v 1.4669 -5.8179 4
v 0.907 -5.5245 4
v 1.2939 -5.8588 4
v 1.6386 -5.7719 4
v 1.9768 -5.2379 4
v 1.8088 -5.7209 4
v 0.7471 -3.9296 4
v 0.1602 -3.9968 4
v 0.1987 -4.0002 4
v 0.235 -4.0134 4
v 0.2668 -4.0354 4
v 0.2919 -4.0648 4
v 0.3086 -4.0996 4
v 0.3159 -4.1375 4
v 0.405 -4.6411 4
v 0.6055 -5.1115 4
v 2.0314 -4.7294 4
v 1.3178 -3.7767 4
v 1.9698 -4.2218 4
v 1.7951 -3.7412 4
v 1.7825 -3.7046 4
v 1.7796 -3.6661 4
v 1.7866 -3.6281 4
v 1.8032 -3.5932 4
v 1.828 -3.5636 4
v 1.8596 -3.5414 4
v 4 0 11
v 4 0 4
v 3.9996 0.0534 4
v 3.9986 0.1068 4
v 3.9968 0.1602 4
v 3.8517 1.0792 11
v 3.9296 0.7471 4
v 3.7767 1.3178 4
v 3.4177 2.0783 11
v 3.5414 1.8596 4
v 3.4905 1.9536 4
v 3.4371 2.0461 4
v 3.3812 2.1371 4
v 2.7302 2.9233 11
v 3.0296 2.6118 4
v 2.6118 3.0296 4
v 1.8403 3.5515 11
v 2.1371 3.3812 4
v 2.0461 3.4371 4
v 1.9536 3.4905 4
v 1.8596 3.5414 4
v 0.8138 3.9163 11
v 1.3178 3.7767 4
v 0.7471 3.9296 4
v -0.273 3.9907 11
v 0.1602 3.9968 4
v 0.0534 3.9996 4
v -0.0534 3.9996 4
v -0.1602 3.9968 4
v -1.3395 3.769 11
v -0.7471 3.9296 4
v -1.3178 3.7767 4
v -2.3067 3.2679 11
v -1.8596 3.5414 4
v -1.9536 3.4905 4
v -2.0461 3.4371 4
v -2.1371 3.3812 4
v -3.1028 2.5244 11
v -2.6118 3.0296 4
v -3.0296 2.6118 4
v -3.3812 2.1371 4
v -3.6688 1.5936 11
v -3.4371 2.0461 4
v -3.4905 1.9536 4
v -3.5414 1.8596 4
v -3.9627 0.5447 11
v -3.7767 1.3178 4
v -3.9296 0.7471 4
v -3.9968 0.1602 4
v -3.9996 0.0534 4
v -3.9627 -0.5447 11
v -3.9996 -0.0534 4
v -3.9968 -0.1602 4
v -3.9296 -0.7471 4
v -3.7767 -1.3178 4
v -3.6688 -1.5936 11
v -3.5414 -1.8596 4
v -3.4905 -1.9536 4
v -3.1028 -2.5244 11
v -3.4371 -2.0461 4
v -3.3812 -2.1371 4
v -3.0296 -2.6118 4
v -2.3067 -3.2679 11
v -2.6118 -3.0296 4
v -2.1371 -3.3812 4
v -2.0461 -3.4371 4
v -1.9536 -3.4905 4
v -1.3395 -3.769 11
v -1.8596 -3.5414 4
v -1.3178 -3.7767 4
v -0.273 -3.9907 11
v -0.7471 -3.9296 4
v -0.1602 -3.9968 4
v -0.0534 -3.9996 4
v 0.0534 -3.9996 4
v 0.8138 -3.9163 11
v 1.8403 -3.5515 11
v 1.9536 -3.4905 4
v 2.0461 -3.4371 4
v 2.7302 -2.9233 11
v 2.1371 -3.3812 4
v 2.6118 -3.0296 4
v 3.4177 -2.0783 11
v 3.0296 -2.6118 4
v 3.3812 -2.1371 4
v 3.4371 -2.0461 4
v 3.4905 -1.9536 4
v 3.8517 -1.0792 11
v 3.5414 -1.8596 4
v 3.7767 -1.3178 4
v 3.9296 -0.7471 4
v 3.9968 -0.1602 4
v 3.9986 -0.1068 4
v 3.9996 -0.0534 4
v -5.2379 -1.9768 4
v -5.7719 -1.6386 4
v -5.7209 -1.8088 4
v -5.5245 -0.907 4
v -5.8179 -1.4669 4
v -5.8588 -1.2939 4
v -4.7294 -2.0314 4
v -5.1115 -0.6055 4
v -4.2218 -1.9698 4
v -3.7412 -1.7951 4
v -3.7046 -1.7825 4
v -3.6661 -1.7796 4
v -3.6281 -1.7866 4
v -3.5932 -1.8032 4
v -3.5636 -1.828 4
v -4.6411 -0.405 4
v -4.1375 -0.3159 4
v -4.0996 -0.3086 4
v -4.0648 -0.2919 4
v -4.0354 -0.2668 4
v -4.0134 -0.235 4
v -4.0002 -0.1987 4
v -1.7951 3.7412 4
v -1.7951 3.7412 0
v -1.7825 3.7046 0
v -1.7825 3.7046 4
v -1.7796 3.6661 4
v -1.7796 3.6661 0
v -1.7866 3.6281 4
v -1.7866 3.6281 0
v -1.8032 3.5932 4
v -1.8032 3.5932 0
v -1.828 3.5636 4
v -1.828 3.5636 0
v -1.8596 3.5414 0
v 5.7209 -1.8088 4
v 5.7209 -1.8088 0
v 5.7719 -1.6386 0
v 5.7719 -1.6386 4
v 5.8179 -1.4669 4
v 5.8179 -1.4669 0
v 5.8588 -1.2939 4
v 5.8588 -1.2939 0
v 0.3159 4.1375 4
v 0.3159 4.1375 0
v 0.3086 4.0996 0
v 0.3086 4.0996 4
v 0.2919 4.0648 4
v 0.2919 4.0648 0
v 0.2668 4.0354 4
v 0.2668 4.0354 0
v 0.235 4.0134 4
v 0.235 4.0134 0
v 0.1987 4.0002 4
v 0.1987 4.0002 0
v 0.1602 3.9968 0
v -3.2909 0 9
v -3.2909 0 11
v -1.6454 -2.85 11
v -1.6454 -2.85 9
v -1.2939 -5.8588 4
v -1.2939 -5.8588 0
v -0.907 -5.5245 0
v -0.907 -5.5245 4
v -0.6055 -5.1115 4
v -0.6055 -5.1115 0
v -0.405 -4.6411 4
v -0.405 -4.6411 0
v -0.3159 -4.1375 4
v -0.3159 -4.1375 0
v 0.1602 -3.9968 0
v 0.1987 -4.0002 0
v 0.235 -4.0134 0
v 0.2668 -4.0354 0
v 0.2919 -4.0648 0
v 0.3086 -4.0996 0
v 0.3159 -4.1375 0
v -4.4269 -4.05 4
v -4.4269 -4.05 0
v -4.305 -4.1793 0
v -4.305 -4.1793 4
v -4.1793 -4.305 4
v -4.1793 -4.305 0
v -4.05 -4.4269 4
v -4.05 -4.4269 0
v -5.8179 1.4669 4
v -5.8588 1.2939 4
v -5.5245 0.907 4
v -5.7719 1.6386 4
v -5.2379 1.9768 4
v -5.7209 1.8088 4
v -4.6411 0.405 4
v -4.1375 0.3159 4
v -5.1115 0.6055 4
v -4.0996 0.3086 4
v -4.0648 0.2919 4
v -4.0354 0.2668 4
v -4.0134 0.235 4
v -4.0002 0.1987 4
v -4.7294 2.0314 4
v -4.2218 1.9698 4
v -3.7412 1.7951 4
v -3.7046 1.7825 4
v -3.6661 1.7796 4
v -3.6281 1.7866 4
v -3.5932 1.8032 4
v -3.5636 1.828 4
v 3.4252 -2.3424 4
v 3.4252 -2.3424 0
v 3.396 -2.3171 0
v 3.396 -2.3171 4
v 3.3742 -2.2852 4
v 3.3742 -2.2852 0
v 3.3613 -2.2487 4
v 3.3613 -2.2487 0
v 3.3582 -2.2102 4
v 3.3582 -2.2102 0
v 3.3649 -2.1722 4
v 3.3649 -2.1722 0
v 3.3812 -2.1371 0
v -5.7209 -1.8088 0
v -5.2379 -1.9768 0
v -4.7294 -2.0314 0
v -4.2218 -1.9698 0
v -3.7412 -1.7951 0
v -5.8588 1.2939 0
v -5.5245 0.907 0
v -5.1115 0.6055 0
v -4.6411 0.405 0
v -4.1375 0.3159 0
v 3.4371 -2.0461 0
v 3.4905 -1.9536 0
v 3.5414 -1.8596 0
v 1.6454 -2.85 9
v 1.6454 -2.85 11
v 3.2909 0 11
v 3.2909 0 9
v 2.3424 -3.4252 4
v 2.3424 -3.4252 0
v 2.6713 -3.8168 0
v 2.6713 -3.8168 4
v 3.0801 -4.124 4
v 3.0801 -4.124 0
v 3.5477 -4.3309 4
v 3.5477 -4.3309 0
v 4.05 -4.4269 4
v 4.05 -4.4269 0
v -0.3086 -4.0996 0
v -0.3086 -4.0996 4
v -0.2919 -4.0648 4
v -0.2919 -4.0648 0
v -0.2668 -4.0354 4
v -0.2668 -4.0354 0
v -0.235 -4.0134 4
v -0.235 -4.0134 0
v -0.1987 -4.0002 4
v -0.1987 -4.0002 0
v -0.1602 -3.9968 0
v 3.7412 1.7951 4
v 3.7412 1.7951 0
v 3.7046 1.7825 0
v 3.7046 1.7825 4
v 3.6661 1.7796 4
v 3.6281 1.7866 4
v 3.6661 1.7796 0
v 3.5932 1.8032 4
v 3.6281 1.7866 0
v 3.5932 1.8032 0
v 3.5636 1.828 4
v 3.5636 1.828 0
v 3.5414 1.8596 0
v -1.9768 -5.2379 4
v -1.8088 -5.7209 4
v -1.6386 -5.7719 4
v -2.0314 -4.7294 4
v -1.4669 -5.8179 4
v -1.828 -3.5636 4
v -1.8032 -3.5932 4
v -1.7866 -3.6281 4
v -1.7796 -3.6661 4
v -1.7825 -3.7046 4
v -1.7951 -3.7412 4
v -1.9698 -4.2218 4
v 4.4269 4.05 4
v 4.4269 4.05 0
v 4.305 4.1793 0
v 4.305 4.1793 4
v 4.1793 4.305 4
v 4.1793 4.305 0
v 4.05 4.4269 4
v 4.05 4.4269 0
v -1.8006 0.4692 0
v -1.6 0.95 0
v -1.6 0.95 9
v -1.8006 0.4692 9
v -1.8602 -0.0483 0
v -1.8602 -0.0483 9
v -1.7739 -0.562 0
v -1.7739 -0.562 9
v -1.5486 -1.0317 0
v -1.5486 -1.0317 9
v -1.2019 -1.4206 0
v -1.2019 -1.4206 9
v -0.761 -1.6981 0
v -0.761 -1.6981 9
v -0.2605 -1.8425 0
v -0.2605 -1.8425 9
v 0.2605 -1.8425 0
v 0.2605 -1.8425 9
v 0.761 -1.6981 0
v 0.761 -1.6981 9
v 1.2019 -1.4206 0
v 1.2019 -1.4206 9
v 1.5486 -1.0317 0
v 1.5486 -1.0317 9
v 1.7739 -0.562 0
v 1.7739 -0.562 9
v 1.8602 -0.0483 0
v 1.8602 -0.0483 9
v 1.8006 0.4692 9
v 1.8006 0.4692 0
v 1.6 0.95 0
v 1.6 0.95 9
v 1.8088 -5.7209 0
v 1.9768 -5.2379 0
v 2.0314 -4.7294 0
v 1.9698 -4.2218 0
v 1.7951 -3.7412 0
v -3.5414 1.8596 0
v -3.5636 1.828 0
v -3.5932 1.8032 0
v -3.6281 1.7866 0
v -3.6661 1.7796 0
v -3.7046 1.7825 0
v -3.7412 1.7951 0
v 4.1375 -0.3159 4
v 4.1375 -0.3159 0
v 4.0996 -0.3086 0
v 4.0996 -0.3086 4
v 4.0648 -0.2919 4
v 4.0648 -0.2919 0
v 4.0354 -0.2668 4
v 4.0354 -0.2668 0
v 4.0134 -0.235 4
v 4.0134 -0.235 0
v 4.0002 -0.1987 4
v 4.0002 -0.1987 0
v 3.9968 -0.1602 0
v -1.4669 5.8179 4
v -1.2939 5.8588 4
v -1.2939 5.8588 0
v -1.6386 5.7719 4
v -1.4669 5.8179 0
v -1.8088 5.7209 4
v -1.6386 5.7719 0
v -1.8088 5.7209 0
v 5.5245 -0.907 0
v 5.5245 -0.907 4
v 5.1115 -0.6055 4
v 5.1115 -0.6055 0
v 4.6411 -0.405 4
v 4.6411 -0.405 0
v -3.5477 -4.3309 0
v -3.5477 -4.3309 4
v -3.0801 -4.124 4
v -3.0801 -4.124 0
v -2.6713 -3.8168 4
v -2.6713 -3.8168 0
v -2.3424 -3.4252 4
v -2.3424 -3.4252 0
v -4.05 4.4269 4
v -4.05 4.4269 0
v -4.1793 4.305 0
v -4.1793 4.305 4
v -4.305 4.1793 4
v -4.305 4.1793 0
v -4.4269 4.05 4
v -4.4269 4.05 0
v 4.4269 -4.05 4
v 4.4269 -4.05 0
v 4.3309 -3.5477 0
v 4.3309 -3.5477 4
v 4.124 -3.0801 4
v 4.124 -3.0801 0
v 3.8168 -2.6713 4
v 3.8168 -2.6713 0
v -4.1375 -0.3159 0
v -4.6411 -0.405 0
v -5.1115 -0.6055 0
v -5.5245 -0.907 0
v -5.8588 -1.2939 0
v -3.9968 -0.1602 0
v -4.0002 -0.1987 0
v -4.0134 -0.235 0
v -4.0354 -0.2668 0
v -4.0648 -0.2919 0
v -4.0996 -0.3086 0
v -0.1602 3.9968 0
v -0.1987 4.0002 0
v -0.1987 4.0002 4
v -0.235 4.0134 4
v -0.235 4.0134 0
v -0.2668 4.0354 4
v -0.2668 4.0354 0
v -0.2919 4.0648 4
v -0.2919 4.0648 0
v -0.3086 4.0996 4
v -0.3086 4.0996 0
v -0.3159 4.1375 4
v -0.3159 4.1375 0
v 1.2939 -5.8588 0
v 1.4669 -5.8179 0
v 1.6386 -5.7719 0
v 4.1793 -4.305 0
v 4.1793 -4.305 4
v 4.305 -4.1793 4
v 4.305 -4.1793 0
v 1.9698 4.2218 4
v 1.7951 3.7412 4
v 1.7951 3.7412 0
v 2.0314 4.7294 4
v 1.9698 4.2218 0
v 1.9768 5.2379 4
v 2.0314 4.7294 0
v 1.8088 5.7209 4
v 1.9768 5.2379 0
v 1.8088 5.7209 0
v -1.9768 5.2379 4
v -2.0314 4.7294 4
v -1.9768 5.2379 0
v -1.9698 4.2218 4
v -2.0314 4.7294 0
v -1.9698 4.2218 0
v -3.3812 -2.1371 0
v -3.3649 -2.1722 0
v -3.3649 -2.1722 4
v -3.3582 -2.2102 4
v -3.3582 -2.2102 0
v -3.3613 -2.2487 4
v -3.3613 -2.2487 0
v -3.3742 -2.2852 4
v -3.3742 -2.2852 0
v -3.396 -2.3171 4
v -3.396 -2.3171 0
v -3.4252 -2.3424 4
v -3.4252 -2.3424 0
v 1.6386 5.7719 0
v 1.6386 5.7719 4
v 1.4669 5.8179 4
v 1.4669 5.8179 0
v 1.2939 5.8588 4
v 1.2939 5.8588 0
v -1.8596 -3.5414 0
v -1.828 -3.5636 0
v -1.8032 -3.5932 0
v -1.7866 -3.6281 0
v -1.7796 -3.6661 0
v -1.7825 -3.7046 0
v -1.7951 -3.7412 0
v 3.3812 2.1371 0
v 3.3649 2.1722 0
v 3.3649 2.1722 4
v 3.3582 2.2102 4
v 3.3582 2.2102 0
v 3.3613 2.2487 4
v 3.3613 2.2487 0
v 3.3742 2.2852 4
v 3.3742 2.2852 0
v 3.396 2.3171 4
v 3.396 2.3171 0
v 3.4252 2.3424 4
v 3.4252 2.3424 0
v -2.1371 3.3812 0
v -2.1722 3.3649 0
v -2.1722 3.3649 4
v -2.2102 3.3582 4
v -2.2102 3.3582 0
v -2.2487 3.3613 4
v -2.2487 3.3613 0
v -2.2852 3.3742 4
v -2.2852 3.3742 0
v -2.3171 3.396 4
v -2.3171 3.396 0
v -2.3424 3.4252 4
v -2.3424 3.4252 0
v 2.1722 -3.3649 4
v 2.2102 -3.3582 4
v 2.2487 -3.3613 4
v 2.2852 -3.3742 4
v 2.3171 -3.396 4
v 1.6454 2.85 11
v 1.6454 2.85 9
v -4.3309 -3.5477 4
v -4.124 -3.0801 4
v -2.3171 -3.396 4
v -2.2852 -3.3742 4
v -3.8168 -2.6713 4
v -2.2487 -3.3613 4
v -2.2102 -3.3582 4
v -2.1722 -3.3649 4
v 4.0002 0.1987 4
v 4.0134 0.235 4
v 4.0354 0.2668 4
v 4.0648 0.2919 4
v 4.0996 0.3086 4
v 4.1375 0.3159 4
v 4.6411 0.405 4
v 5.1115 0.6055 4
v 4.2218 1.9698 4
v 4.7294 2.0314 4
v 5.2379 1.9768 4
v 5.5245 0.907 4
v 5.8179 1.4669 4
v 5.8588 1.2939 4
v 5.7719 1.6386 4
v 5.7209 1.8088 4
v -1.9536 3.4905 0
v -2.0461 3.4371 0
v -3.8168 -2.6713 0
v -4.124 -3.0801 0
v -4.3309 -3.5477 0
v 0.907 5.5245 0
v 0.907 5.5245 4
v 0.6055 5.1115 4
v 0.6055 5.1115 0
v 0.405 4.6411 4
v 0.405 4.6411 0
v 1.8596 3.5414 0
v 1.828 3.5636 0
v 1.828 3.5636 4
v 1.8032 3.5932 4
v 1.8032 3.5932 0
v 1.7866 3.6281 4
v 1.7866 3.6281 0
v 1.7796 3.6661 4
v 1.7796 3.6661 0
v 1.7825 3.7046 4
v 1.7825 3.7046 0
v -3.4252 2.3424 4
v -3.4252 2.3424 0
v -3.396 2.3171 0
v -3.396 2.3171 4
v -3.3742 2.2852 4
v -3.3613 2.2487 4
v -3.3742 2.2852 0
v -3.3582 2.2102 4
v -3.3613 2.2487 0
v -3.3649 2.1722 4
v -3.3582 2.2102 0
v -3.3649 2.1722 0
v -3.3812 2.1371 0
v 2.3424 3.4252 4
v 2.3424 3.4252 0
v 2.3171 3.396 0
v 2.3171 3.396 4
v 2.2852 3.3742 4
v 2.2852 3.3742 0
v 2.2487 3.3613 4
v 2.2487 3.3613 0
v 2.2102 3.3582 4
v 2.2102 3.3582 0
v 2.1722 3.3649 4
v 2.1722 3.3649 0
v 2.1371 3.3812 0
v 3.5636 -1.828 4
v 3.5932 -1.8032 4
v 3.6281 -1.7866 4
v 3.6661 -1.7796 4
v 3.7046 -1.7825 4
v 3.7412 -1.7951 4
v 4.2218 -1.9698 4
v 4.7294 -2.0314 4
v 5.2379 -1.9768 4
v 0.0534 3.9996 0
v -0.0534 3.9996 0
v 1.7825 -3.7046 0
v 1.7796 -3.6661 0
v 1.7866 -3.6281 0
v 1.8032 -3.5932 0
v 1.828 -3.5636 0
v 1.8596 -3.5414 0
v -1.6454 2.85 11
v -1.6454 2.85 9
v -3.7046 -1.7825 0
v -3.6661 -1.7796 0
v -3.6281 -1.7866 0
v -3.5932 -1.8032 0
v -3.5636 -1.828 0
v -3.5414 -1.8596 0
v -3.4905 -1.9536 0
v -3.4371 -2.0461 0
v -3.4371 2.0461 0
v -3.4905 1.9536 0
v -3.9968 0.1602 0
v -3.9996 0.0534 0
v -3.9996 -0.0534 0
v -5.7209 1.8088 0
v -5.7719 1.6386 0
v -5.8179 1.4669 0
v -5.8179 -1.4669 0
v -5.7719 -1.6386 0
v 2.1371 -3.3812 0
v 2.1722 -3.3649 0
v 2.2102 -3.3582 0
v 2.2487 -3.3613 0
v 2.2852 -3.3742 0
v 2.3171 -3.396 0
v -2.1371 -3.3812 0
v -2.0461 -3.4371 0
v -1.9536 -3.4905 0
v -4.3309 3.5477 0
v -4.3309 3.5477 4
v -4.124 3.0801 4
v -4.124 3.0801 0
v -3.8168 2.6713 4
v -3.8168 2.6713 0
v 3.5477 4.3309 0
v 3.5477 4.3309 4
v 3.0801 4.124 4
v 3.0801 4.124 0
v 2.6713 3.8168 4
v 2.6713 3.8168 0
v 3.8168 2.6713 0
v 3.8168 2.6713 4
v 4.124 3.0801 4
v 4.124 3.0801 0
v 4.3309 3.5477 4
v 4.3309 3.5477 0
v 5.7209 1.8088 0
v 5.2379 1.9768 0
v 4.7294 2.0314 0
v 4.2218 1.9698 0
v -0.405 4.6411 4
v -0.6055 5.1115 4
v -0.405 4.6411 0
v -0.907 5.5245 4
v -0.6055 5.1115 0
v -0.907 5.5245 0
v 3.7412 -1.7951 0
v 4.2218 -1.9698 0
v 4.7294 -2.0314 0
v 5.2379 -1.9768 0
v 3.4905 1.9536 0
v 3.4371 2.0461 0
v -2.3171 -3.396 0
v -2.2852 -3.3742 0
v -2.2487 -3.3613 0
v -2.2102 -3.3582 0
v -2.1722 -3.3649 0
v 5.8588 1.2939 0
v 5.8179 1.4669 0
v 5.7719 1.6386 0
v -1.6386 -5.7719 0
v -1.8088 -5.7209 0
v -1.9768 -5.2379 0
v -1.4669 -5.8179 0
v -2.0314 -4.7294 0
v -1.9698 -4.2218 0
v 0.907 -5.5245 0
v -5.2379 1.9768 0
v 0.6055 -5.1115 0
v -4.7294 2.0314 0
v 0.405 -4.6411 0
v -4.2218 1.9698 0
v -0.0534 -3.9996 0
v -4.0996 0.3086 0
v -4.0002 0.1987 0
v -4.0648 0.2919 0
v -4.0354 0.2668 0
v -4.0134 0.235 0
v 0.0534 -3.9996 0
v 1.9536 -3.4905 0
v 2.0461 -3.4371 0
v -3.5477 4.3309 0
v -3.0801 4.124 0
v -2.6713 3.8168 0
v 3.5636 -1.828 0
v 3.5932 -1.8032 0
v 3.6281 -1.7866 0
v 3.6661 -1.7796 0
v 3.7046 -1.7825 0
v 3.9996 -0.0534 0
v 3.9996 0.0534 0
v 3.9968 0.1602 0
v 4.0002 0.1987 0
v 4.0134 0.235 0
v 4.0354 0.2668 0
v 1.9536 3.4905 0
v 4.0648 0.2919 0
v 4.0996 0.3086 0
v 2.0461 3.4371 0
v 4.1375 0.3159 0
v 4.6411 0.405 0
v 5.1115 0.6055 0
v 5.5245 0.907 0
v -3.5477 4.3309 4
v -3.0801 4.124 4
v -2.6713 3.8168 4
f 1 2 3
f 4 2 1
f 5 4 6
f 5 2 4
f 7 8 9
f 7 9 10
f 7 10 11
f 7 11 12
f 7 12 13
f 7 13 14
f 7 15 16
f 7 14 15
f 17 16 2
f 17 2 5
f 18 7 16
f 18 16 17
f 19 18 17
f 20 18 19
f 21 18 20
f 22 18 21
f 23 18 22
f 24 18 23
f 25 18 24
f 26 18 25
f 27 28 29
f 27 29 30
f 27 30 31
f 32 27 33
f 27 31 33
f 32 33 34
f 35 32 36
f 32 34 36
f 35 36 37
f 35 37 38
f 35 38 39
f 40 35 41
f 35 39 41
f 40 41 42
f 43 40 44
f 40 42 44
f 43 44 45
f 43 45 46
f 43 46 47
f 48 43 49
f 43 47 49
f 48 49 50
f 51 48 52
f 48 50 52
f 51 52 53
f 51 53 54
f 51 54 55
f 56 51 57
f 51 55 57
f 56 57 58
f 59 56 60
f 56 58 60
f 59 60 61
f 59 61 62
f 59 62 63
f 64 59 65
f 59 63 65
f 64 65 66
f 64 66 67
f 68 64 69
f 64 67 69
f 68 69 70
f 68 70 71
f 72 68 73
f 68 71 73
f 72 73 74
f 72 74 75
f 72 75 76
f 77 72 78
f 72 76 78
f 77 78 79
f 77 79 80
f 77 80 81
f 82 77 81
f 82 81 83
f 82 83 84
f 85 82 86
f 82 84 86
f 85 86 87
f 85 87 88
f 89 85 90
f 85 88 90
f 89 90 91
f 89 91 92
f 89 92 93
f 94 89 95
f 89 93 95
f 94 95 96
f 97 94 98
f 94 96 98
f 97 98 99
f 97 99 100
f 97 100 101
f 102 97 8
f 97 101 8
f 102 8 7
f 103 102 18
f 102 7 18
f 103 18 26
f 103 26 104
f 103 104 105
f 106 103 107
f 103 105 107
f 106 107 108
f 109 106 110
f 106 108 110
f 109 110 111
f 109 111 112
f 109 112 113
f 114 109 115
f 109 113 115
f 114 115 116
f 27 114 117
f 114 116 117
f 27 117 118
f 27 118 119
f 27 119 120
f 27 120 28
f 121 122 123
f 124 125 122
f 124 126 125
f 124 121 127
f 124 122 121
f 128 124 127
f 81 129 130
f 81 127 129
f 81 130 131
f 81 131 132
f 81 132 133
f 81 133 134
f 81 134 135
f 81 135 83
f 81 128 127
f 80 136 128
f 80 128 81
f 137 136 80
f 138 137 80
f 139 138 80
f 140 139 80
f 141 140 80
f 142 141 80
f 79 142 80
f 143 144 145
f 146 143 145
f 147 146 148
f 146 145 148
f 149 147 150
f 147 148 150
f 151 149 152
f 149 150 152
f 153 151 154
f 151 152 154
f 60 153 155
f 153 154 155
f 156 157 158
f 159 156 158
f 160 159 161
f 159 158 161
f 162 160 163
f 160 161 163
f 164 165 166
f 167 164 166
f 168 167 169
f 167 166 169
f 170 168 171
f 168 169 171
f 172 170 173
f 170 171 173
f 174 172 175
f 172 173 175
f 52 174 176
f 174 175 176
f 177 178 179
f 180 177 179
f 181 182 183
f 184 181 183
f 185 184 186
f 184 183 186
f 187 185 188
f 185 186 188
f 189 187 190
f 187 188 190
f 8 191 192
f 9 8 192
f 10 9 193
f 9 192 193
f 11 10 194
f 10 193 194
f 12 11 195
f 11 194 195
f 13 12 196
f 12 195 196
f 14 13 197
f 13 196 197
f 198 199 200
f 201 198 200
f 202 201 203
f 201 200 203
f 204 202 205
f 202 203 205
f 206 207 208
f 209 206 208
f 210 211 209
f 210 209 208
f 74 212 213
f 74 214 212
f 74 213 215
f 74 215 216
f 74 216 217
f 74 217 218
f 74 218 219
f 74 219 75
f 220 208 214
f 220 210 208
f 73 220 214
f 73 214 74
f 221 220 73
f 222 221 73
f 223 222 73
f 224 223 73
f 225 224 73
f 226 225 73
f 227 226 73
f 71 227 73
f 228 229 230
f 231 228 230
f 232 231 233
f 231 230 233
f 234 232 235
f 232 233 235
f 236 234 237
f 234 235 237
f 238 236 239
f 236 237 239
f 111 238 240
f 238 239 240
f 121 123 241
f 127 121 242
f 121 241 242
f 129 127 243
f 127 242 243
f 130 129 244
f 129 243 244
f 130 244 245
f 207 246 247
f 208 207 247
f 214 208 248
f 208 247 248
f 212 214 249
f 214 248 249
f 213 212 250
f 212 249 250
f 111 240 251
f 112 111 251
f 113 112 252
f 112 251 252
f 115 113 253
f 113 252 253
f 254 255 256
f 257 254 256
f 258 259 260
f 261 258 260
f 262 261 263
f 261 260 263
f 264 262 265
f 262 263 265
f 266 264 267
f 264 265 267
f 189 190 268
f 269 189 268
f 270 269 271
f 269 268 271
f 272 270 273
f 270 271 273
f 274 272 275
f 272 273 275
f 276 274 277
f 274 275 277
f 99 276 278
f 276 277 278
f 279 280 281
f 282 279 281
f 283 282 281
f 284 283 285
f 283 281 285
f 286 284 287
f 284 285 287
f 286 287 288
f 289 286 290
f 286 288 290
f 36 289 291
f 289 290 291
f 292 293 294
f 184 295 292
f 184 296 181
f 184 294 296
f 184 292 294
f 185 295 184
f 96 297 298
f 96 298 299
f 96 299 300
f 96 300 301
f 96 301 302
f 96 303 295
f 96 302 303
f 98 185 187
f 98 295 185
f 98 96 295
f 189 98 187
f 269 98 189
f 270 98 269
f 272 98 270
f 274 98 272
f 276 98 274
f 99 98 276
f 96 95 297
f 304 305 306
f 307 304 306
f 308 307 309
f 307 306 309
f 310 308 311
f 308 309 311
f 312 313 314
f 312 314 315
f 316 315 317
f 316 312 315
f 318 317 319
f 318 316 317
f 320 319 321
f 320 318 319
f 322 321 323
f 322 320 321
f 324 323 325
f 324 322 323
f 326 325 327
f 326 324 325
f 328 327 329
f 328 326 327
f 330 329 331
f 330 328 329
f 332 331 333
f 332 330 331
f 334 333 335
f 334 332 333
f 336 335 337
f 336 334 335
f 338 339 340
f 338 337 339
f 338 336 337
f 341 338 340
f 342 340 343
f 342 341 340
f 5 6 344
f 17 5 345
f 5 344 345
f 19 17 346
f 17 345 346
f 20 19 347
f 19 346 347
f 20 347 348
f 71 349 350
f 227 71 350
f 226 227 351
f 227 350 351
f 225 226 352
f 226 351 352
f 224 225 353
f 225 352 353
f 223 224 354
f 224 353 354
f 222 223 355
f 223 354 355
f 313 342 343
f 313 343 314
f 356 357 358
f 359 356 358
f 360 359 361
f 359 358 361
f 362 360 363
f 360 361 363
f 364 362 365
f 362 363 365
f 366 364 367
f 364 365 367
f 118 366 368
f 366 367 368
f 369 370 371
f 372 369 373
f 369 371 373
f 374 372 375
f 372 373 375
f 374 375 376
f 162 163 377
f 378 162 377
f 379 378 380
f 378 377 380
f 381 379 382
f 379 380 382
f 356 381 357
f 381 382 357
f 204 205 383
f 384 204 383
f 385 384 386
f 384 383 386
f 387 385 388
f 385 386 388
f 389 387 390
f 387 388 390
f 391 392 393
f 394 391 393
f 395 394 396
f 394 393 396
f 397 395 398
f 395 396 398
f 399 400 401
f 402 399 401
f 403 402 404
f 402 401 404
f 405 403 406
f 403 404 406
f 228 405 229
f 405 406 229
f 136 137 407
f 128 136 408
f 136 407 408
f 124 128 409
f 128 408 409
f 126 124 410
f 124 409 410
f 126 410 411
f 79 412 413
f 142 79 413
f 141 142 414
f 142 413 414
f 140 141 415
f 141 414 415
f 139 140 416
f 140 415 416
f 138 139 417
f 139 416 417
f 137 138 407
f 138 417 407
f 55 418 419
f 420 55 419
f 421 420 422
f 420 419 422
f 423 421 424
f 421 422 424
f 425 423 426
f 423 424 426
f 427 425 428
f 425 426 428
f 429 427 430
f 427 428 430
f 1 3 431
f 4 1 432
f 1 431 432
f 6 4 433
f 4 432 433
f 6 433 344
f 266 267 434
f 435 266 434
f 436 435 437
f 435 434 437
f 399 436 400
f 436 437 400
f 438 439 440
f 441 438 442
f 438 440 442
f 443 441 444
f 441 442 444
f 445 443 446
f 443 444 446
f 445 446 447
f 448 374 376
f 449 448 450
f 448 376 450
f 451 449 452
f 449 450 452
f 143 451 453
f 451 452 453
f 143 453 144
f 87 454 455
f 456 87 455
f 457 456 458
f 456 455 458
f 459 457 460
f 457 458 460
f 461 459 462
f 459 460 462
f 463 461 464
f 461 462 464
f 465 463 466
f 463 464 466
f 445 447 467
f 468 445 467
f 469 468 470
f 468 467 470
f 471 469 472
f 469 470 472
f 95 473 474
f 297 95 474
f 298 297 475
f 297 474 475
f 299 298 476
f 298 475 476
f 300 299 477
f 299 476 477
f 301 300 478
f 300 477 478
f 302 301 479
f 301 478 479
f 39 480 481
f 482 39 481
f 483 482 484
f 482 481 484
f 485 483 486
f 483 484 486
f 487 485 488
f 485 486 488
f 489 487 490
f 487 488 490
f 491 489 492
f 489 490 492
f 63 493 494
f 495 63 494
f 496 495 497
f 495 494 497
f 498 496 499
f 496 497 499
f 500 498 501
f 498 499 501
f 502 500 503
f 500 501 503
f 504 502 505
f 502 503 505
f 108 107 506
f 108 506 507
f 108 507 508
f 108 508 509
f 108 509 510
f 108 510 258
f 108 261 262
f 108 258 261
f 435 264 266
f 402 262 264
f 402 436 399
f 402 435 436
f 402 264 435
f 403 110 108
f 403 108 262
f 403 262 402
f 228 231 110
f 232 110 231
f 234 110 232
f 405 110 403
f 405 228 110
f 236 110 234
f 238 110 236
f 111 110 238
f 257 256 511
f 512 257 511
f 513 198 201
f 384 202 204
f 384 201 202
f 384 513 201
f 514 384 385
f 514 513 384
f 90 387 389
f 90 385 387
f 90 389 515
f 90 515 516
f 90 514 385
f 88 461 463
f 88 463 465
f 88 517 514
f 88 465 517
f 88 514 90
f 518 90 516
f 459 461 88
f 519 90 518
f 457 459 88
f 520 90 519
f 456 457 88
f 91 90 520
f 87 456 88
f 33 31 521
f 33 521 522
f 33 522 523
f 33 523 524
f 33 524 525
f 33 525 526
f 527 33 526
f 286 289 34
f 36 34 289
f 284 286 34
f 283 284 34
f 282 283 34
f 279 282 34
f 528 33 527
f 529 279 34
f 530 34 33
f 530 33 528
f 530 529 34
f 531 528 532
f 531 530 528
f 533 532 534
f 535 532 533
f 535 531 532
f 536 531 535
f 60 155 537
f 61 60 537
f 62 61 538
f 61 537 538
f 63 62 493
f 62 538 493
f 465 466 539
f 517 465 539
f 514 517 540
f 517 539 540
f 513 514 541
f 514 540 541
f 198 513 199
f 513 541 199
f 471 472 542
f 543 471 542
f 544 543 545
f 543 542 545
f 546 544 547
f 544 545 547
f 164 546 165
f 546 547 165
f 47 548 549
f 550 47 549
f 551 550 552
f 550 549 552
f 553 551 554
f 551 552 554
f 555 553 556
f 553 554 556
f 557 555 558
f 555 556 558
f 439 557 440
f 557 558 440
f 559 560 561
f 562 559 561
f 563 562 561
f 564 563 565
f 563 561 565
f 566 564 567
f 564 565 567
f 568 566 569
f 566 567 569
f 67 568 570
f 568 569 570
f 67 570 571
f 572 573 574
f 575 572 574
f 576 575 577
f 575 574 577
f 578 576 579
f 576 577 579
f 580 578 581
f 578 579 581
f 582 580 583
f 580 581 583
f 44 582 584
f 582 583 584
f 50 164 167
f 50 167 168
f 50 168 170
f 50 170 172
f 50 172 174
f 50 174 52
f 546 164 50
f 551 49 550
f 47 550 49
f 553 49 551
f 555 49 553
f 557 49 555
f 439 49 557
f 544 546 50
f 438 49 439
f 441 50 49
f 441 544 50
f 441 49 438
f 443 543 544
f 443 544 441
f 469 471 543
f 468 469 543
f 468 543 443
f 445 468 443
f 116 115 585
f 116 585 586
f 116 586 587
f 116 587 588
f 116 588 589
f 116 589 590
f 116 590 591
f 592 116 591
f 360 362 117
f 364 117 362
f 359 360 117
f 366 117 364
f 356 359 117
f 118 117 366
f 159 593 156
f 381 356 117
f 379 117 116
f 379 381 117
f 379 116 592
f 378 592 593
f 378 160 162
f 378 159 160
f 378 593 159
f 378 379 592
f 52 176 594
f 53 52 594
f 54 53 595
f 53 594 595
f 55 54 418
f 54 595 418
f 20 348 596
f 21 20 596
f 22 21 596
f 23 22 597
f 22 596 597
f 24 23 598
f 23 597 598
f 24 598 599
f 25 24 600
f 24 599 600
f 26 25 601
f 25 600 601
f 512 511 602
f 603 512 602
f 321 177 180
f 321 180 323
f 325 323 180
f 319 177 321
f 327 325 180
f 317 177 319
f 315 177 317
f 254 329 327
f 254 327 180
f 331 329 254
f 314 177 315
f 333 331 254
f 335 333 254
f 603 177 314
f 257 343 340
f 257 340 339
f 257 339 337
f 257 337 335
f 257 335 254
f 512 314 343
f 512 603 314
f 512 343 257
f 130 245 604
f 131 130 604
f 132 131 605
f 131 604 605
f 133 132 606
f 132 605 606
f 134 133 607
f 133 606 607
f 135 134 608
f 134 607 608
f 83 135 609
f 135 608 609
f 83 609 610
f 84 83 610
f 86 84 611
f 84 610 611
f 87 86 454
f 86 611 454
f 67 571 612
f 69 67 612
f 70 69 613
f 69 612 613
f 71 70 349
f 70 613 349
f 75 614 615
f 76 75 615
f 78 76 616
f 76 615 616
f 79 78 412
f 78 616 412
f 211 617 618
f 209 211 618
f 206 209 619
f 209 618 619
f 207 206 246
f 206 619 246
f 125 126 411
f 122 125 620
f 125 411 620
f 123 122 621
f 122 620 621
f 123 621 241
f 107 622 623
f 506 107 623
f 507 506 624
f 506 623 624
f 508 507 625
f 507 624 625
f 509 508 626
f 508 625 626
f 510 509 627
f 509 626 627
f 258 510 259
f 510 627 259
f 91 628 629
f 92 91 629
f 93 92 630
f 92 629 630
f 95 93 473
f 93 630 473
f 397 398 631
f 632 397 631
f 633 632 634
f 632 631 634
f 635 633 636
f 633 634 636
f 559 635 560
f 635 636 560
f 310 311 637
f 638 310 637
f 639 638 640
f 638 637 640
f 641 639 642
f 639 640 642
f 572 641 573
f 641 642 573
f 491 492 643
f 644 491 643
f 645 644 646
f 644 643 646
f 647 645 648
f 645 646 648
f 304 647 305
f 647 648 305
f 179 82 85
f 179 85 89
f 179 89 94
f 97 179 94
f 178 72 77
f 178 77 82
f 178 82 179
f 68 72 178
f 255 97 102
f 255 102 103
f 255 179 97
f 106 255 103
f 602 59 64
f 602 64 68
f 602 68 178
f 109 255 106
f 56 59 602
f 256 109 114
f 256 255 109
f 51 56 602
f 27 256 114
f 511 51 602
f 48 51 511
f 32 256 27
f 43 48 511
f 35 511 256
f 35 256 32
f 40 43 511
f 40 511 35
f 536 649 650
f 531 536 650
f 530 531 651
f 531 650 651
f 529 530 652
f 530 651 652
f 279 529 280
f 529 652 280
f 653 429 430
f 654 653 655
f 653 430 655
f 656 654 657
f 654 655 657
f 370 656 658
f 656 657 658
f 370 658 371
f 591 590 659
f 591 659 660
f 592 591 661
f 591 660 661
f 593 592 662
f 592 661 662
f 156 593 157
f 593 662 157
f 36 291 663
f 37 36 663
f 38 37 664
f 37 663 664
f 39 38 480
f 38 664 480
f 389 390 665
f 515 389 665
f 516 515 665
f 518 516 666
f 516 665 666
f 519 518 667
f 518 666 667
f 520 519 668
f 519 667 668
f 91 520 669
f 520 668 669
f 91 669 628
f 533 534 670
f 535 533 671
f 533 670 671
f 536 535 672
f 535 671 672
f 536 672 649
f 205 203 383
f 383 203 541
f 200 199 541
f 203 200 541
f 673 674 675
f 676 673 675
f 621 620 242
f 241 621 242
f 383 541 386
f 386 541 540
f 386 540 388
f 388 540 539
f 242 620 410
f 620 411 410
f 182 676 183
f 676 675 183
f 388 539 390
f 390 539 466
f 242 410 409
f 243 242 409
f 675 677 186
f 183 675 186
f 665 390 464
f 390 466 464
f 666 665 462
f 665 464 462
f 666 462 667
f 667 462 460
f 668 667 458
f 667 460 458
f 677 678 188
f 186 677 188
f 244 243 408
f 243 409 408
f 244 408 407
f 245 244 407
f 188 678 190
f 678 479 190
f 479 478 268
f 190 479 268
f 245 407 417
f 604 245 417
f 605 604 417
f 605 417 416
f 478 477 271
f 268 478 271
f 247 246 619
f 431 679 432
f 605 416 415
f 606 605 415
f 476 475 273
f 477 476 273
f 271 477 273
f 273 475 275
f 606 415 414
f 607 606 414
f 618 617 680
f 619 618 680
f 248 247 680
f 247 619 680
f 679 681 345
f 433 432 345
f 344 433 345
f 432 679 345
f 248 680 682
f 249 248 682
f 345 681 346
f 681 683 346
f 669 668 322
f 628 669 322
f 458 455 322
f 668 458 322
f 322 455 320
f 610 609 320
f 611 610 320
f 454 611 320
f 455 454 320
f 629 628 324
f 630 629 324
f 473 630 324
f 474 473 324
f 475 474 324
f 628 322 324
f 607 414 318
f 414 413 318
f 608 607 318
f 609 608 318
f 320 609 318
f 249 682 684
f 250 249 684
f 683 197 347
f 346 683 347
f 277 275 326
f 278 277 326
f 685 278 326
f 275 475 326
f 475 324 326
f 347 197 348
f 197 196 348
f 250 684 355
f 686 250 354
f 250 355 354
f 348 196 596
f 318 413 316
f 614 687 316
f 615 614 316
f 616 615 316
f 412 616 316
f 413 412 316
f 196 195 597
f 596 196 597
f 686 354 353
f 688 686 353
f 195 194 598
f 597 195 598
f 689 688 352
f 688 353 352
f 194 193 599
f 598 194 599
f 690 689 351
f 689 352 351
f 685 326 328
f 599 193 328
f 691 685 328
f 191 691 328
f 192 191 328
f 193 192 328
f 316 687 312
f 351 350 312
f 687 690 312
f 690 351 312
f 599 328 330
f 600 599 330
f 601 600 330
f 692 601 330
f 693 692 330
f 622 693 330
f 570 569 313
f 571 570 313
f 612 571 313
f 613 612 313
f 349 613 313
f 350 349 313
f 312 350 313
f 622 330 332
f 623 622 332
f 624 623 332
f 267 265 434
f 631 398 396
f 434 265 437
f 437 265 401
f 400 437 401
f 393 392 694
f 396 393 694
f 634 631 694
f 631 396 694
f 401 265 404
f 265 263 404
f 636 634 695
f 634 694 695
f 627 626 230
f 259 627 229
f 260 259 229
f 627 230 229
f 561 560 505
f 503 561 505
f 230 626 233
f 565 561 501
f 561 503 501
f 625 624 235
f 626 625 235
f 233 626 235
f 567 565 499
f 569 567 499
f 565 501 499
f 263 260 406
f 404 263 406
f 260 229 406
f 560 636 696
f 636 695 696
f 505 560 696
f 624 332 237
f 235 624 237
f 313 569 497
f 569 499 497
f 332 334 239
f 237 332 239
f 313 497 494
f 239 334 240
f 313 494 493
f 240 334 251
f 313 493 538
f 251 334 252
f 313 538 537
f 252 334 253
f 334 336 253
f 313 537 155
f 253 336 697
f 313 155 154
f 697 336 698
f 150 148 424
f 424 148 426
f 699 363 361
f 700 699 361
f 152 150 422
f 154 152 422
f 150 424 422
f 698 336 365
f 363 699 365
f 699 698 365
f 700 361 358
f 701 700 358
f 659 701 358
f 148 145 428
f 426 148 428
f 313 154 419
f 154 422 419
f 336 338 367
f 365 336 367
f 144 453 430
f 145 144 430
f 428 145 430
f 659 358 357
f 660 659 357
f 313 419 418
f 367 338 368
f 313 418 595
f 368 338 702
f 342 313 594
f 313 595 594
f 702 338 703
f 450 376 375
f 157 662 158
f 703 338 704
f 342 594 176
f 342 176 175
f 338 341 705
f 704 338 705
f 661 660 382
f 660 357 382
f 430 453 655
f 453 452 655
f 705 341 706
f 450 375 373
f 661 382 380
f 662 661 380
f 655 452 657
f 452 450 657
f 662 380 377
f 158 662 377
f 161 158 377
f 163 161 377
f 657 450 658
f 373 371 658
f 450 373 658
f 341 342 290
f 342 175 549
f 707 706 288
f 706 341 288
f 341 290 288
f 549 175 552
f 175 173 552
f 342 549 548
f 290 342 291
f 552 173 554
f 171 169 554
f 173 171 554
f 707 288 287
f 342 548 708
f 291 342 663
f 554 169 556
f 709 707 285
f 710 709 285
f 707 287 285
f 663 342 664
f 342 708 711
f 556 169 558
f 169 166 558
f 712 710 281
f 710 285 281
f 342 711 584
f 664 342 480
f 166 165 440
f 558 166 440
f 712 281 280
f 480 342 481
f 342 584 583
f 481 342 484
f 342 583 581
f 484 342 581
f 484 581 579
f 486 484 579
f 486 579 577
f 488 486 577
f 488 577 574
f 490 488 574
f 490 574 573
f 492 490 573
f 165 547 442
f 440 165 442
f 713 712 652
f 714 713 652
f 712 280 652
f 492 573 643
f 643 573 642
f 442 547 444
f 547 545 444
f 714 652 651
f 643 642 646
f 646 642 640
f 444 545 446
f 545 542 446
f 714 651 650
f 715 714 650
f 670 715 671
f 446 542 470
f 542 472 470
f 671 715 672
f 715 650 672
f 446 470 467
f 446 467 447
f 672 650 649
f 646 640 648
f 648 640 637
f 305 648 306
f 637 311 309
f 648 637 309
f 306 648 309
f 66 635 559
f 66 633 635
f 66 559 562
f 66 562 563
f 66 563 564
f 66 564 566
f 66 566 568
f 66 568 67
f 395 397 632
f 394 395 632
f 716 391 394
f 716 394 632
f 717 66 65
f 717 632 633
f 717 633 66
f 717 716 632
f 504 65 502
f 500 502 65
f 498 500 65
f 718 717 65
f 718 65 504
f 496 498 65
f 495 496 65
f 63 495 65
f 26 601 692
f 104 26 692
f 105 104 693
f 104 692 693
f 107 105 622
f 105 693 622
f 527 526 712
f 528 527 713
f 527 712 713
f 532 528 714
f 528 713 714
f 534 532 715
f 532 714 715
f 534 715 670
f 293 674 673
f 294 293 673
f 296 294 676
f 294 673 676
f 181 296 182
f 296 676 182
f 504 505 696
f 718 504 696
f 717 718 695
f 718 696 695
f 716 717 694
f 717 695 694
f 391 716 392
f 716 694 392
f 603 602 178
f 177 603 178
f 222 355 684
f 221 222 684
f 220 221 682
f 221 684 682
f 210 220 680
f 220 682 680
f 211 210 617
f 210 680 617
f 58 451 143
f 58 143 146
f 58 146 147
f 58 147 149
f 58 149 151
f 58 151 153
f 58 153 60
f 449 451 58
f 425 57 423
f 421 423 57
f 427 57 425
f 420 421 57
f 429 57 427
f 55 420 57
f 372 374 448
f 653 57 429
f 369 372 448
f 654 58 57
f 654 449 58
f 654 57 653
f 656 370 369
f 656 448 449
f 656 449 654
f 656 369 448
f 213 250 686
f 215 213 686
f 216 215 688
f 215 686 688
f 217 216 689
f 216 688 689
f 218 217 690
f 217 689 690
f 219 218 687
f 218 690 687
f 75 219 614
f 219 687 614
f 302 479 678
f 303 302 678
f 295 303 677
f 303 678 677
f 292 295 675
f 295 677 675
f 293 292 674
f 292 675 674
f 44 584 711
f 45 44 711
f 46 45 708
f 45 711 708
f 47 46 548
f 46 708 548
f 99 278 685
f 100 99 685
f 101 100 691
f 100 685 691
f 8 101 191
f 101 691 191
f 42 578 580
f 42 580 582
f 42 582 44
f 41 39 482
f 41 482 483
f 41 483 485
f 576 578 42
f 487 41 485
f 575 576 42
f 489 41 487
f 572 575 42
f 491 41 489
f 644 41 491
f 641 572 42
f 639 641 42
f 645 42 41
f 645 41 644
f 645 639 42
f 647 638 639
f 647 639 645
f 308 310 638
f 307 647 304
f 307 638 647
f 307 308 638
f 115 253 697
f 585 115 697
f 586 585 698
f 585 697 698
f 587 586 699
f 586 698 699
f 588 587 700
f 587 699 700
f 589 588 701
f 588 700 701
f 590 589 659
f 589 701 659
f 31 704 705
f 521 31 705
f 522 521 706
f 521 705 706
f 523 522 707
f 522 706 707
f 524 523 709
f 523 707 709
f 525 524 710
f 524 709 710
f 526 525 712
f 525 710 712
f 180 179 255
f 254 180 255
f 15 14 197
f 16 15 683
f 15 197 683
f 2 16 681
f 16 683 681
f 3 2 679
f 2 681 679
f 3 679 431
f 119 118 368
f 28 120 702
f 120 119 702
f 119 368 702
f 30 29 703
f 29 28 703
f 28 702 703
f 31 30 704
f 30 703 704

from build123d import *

# Parameters (mm, degrees)
SKETCH1_R           = 6
SKETCH1_R_2         = 2
BOSS_EXTRUDE1_DEPTH = 4
CUT_EXTRUDE2_DEPTH  = 5
CIRPATTERN2_COUNT   = 12
SKETCH11_R          = 4
BOSS_EXTRUDE2_DEPTH = 11
CUT_EXTRUDE3_START  = 11
CUT_EXTRUDE3_DEPTH  = 2
CUT_EXTRUDE4_DEPTH  = 12


with BuildPart() as part:
    # Sketch1 → Boss-Extrude1 (new body)
    with BuildSketch(Plane.XY):
        Circle(SKETCH1_R)
        Circle(SKETCH1_R_2, mode=Mode.SUBTRACT)
    extrude(amount=BOSS_EXTRUDE1_DEPTH)

    # Sketch4 → Cut-Extrude2 (cut, through all)
    with BuildSketch(Plane.XY):
        with BuildLine():
            ThreePointArc((-0.160215471, 3.996790087), (-0.266788325, 4.035374045), (-0.315943185, 4.137502858))
            ThreePointArc((-0.315943185, 4.137502858), (-0.829511973, 5.435929685), (-2.010193861, 6.181352655))
            ThreePointArc((-2.010193861, 6.181352655), (0, 6.5), (2.010193861, 6.181352655))
            ThreePointArc((2.010193861, 6.181352655), (0.829511973, 5.435929685), (0.315943185, 4.137502858))
            ThreePointArc((0.315943185, 4.137502858), (0.266788325, 4.035374045), (0.160215471, 3.996790087))
            ThreePointArc((0.160215471, 3.996790087), (0, 4), (-0.160215471, 3.996790087))
        make_face()
    cut_extrude2 = extrude(amount=CUT_EXTRUDE2_DEPTH, mode=Mode.SUBTRACT)

    # CirPattern2: Cut-Extrude2 ×12 about axis
    cirpattern2_axis = Axis((0, 0, 0), (0, 0, 1))
    for i in range(1, CIRPATTERN2_COUNT):
        add(cut_extrude2.rotate(cirpattern2_axis, i * 360 / CIRPATTERN2_COUNT), mode=Mode.SUBTRACT)

    # Sketch11 → Boss-Extrude2 (add)
    with BuildSketch(Plane.XY):
        Circle(SKETCH11_R)
    extrude(amount=BOSS_EXTRUDE2_DEPTH)

    # Sketch12 → Cut-Extrude3 (cut)
    with BuildSketch(Plane.XY.offset(CUT_EXTRUDE3_START)):
        Polygon((3.290896534, 0), (1.645448267, 2.85), (-1.645448267, 2.85), (-3.290896534, 0), (-1.645448267, -2.85), (1.645448267, -2.85), align=None)
    extrude(amount=-CUT_EXTRUDE3_DEPTH, mode=Mode.SUBTRACT)

    # Sketch13 → Cut-Extrude4 (cut, through all)
    with BuildSketch(Plane.XY):
        with BuildLine():
            Line((1.6, 0.95), (-1.6, 0.95))
            ThreePointArc((-1.6, 0.95), (0, -1.860779407), (1.6, 0.95))
        make_face()
    extrude(amount=CUT_EXTRUDE4_DEPTH, mode=Mode.SUBTRACT)


solid = part.part
